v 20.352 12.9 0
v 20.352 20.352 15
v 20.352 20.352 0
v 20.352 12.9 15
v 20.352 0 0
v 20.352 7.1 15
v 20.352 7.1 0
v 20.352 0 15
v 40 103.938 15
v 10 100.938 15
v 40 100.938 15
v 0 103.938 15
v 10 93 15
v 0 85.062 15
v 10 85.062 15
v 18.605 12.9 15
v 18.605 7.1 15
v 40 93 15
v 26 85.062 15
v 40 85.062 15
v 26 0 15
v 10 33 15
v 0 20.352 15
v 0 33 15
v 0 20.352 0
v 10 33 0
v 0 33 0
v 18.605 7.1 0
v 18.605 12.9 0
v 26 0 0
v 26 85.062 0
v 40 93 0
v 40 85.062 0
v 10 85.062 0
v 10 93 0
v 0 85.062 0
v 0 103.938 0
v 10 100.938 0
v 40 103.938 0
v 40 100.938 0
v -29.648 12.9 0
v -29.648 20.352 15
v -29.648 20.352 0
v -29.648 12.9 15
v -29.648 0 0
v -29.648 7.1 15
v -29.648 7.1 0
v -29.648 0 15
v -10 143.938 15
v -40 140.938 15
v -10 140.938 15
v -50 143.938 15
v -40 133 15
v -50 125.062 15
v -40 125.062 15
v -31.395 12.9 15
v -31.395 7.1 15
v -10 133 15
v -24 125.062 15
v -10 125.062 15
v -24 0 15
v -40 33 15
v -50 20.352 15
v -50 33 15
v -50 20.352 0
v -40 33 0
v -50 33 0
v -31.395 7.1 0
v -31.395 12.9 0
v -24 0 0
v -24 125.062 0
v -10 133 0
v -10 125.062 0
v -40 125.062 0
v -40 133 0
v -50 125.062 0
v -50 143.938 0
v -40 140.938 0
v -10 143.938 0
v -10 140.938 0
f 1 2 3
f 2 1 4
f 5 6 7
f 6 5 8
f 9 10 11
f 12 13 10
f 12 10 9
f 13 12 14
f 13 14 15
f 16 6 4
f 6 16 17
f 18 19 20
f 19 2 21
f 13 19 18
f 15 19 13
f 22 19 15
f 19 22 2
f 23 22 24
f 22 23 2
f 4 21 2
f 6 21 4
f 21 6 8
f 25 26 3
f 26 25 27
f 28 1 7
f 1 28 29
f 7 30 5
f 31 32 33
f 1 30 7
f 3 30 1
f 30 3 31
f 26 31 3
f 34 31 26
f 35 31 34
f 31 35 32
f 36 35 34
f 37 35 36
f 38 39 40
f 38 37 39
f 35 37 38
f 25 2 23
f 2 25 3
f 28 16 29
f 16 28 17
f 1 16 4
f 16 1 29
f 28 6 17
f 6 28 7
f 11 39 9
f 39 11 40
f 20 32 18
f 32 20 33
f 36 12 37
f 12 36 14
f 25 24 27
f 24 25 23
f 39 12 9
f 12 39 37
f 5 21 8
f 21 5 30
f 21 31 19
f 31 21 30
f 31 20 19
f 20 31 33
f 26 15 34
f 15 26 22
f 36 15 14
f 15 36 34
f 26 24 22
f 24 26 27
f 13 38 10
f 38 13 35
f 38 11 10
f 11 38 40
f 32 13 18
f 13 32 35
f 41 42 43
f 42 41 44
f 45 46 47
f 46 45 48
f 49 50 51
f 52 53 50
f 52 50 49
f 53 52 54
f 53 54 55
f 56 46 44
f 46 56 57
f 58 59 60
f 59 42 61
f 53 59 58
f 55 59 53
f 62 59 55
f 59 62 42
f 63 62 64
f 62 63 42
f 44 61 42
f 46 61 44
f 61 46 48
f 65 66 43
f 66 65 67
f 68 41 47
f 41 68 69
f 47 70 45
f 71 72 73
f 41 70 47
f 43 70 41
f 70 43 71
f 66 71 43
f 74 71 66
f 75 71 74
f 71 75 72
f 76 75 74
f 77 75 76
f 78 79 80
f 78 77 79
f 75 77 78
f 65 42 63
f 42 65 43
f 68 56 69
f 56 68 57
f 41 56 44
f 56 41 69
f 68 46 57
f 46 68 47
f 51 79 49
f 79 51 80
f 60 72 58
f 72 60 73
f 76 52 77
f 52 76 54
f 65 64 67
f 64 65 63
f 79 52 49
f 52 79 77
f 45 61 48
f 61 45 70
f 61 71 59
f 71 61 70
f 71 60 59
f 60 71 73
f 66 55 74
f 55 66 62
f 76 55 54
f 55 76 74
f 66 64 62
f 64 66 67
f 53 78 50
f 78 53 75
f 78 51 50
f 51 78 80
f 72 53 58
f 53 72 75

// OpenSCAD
// file: inc/functions.scad
// PRUSA iteration3
// Functions used in many files
// GNU GPL v3
// Josef Průša <josefprusa@me.com>
// Václav 'ax' Hůla <axtheb@gmail.com>
// Vlnofka <>
// http://www.reprap.org/wiki/Prusa_Mendel
// http://github.com/josefprusa/Prusa3


module nut(d,h,horizontal=true){
    cornerdiameter =  (d / 2) / cos (180 / 6);
    cylinder(h = h, r = cornerdiameter, $fn = 6);
    if(horizontal){
        for(i = [1:6]){
            rotate([0,0,60*i]) translate([-cornerdiameter-0.2,0,0]) rotate([0,0,-45]) cube([2,2,h]);
        }
    }
}

module fillet(radius, height=100, $fn=0) {
    //this creates acutal fillet
    translate([-radius, -radius, -height / 2 - 0.02]) difference() {
        cube([radius * 2, radius * 2, height + 0.04]);
        if ($fn == 0 && (radius == 2 || radius == 3 || radius == 4)) {
            cylinder(r=radius, h=height + 0.04, $fn=4 * radius);
        } else {
            cylinder(r=radius, h=height + 0.04, $fn=$fn);
        }

    }
}

module cube_fillet(size, radius=-1, vertical=[3,3,3,3], top=[0,0,0,0], bottom=[0,0,0,0], center=false, $fn=0){
    //
    if (use_fillets == 1) {
        if (center) {
            cube_fillet_inside(size, radius, vertical, top, bottom, $fn);
        } else {
            translate([size[0]/2, size[1]/2, size[2]/2])
                cube_fillet_inside(size, radius, vertical, top, bottom, $fn);
        }
    } else {
        if (use_fillets == 2) {
            if (center) {
                cube_fillet_inside(size, radius, vertical, top, bottom, 4);
            } else {
                translate([size[0]/2, size[1]/2, size[2]/2])
                    cube_fillet_inside(size, radius, vertical, top, bottom, 4);
            }

        } else {
            cube(size, center);
        }
    }

}

module cube_negative_fillet(size, radius=-1, vertical=[3,3,3,3], top=[0,0,0,0], bottom=[0,0,0,0], $fn=0){

    j=[1,0,1,0];

    for (i=[0:3]) {
        if (radius > -1) {
            rotate([0, 0, 90*i]) translate([size[1-j[i]]/2, size[j[i]]/2, 0]) fillet(radius, size[2], $fn=$fn);
        } else {
            rotate([0, 0, 90*i]) translate([size[1-j[i]]/2, size[j[i]]/2, 0]) fillet(vertical[i], size[2], $fn=$fn);
        }
        rotate([90*i, -90, 0]) translate([size[2]/2, size[j[i]]/2, 0 ]) fillet(top[i], size[1-j[i]], $fn=$fn);
        rotate([90*(4-i), 90, 0]) translate([size[2]/2, size[j[i]]/2, 0]) fillet(bottom[i], size[1-j[i]], $fn=$fn);

    }
}

module cube_fillet_inside(size, radius=-1, vertical=[3,3,3,3], top=[0,0,0,0], bottom=[0,0,0,0], $fn=0){
    //makes CENTERED cube with round corners
    // if you give it radius, it will fillet vertical corners.
    //othervise use vertical, top, bottom arrays
    //when viewed from top, it starts in upper right corner (+x,+y quadrant) , goes counterclockwise
    //top/bottom fillet starts in direction of Y axis and goes CCW too


    if (radius == 0) {
        cube(size, center=true);
    } else {
        difference() {
            cube(size, center=true);
            cube_negative_fillet(size, radius, vertical, top, bottom, $fn);
        }
    }
}


module nema17(places=[1,1,1,1], size=15.5, h=10, holes=false, shadow=false, $fn=24){
    for (i=[0:3]) {
        if (places[i] == 1) {
            rotate([0, 0, 90*i]) translate([size, size, 0]) {
                if (holes) {
                    rotate([0, 0, -90*i])  translate([0,0,-10]) screw(r=1.7, slant=false, head_drop=13, $fn=$fn, h=h+12);
                } else {
                    rotate([0, 0, -90*i]) cylinder(h=h, r=5.5, $fn=$fn);
                }
            }
        }
    }
    if (shadow != false) {
        %translate ([0, 0, shadow+21+3]) cube([42,42,42], center = true);
    //flange
        %translate ([0, 0, shadow+21+3-21-1]) cylinder(r=11,h=2, center = true, $fn=20);
    //shaft
        %translate ([0, 0, shadow+21+3-21-7]) cylinder(r=2.5,h=14, center = true);
    }
}

module screw(h=20, r=2, r_head=3.5, head_drop=0, slant=i_am_box, poly=false, $fn=0){
    //makes screw with head
    //for substraction as screw hole
    if (poly) {
        cylinder_poly(h=h, r=r, $fn=$fn);
    } else {
        cylinder(h=h, r=r, $fn=$fn);
    }
    if (slant) {
        translate([0, 0, head_drop-0.01]) cylinder(h=r_head, r2=0, r1=r_head, $fn=$fn);
    }

    if (head_drop > 0) {
        translate([0, 0, -0.01]) cylinder(h=head_drop+0.01, r=r_head, $fn=$fn);
    }
}

module plate_screw(long=0) {
    if (i_am_box == 0) {
        translate([0, 0, -long]) screw(head_drop=14 + long, h=30 + long, r_head=3.6, r=1.7, $fn=24, slant=false);
    } else {
        translate([0, 0, -2 - long]) screw(head_drop=14 + long, h=30 + long, r_head=4.5, r=2, $fn=24, slant=true);
    }
}

//radius of the idler assembly (to surface that touches belt, ignoring guide walls)
function idler_assy_r_inner(idler_bearing) = (idler_bearing[0] / 2) + (6 * single_wall_width + 0.2) * idler_bearing[3];
//outer radius of the idler assembly (to smooth side of belt) 
function idler_assy_r_outer(idler_bearing) = idler_assy_r_inner(idler_bearing) + belt_thickness + 1;

module ext2020(l=20, teeth = [1, 1, 1, 1], depth=1, tolerance=0.2) {
  scale([1.025,1.025,1])translate([0,0,l/2])
  difference(){
    cube([20+tolerance,20+tolerance,l], center=true);
    scale([1.15,1/1.025,1]) {
        if (teeth[0] == 1)
        translate([10-(depth+0.5)+tolerance,0,0])cube([2+depth-tolerance,6-tolerance,l], center=true);
        if (teeth[1] == 1)
        translate([-10+(depth+0.5)-tolerance,0,0])cube([2+depth-tolerance,6-tolerance,l], center=true);
    }
    scale([1/1.025,1.15,1]) {
        if (teeth[2] == 1)
        translate([0,10-(depth+0.5)+tolerance,0])cube([6-tolerance,2-tolerance+depth,l], center=true);
        if (teeth[3] == 1)
        translate([0,-10+(depth+0.5)-tolerance,0])cube([6-tolerance,2-tolerance+depth,l], center=true);
      }
  }
}

module idler_assy(idler_bearing = [22, 7, 8, 1]) {

    //bearing axle
    translate([0,0,-1]) cylinder(h = 120, r=(idler_bearing[2] + 1) / 2, $fn=small_hole_segments, center=true);
    //bearing shadow
    %cylinder(h = idler_bearing[1], r=idler_bearing[0]/2, center=true);
    //belt shadow
    %cylinder(h = belt_width, r=idler_assy_r_outer(idler_bearing), center=true);

    cylinder(h = idler_width + 1, r=idler_assy_r_outer(idler_bearing) + 0.5, center=true);
}

module belt(len, side = 0){
    //belt. To be substracted from model
    //len is in +Z, smooth side in +X, Y centered
    translate([-0.5, 0, 0]) maketeeth(len);
    translate([0, -4.5, -0.01]) cube([belt_thickness, 9, len + 0.02]);
    if (side != 0) {
    translate([0, -4.5 + side, -0.01]) cube_fillet([belt_thickness, 9, len + 0.02], vertical = [3, 0, 0, 0]);
    }
}


module maketeeth(len){
    //Belt teeth. 
    for (i = [0 : len / belt_tooth_distance]) {
        translate([0, 0, i * belt_tooth_distance]) cube([2, 9, belt_tooth_distance * belt_tooth_ratio], center = true);
    }
}
// main file
use<inc/functions.scad>


module panel_bracket(stock=8, holder=3, thick=15, offset=70, bolt=false) 
{
  difference() {
    cube([40,offset+20+stock+holder*2,thick]); // basic shape
    translate([10,10,0])ext2020(thick, teeth=[1,0,0,0]); // 2020 extrusion cutout
    translate([26,-20+holder,0])color("blue")cube([90, 20+20+offset-stock,thick]);
    translate([0,30+holder,0])color("blue")cube([10, offset-stock-10,thick]);
    translate([10,offset+20+holder,0])color("blue")cube([90, stock,thick]);
    if (bolt)
      translate([32,0,5])rotate([-90,0,0])cylinder(r=1.5, h=20+holder*2+stock,$fn=50); // hole to bolt stock on.
  }
}

panel_bracket(stock=(5/16)*25.4);
translate([-50,0,0])panel_bracket(stock=(5/16)*25.4, offset=110);
